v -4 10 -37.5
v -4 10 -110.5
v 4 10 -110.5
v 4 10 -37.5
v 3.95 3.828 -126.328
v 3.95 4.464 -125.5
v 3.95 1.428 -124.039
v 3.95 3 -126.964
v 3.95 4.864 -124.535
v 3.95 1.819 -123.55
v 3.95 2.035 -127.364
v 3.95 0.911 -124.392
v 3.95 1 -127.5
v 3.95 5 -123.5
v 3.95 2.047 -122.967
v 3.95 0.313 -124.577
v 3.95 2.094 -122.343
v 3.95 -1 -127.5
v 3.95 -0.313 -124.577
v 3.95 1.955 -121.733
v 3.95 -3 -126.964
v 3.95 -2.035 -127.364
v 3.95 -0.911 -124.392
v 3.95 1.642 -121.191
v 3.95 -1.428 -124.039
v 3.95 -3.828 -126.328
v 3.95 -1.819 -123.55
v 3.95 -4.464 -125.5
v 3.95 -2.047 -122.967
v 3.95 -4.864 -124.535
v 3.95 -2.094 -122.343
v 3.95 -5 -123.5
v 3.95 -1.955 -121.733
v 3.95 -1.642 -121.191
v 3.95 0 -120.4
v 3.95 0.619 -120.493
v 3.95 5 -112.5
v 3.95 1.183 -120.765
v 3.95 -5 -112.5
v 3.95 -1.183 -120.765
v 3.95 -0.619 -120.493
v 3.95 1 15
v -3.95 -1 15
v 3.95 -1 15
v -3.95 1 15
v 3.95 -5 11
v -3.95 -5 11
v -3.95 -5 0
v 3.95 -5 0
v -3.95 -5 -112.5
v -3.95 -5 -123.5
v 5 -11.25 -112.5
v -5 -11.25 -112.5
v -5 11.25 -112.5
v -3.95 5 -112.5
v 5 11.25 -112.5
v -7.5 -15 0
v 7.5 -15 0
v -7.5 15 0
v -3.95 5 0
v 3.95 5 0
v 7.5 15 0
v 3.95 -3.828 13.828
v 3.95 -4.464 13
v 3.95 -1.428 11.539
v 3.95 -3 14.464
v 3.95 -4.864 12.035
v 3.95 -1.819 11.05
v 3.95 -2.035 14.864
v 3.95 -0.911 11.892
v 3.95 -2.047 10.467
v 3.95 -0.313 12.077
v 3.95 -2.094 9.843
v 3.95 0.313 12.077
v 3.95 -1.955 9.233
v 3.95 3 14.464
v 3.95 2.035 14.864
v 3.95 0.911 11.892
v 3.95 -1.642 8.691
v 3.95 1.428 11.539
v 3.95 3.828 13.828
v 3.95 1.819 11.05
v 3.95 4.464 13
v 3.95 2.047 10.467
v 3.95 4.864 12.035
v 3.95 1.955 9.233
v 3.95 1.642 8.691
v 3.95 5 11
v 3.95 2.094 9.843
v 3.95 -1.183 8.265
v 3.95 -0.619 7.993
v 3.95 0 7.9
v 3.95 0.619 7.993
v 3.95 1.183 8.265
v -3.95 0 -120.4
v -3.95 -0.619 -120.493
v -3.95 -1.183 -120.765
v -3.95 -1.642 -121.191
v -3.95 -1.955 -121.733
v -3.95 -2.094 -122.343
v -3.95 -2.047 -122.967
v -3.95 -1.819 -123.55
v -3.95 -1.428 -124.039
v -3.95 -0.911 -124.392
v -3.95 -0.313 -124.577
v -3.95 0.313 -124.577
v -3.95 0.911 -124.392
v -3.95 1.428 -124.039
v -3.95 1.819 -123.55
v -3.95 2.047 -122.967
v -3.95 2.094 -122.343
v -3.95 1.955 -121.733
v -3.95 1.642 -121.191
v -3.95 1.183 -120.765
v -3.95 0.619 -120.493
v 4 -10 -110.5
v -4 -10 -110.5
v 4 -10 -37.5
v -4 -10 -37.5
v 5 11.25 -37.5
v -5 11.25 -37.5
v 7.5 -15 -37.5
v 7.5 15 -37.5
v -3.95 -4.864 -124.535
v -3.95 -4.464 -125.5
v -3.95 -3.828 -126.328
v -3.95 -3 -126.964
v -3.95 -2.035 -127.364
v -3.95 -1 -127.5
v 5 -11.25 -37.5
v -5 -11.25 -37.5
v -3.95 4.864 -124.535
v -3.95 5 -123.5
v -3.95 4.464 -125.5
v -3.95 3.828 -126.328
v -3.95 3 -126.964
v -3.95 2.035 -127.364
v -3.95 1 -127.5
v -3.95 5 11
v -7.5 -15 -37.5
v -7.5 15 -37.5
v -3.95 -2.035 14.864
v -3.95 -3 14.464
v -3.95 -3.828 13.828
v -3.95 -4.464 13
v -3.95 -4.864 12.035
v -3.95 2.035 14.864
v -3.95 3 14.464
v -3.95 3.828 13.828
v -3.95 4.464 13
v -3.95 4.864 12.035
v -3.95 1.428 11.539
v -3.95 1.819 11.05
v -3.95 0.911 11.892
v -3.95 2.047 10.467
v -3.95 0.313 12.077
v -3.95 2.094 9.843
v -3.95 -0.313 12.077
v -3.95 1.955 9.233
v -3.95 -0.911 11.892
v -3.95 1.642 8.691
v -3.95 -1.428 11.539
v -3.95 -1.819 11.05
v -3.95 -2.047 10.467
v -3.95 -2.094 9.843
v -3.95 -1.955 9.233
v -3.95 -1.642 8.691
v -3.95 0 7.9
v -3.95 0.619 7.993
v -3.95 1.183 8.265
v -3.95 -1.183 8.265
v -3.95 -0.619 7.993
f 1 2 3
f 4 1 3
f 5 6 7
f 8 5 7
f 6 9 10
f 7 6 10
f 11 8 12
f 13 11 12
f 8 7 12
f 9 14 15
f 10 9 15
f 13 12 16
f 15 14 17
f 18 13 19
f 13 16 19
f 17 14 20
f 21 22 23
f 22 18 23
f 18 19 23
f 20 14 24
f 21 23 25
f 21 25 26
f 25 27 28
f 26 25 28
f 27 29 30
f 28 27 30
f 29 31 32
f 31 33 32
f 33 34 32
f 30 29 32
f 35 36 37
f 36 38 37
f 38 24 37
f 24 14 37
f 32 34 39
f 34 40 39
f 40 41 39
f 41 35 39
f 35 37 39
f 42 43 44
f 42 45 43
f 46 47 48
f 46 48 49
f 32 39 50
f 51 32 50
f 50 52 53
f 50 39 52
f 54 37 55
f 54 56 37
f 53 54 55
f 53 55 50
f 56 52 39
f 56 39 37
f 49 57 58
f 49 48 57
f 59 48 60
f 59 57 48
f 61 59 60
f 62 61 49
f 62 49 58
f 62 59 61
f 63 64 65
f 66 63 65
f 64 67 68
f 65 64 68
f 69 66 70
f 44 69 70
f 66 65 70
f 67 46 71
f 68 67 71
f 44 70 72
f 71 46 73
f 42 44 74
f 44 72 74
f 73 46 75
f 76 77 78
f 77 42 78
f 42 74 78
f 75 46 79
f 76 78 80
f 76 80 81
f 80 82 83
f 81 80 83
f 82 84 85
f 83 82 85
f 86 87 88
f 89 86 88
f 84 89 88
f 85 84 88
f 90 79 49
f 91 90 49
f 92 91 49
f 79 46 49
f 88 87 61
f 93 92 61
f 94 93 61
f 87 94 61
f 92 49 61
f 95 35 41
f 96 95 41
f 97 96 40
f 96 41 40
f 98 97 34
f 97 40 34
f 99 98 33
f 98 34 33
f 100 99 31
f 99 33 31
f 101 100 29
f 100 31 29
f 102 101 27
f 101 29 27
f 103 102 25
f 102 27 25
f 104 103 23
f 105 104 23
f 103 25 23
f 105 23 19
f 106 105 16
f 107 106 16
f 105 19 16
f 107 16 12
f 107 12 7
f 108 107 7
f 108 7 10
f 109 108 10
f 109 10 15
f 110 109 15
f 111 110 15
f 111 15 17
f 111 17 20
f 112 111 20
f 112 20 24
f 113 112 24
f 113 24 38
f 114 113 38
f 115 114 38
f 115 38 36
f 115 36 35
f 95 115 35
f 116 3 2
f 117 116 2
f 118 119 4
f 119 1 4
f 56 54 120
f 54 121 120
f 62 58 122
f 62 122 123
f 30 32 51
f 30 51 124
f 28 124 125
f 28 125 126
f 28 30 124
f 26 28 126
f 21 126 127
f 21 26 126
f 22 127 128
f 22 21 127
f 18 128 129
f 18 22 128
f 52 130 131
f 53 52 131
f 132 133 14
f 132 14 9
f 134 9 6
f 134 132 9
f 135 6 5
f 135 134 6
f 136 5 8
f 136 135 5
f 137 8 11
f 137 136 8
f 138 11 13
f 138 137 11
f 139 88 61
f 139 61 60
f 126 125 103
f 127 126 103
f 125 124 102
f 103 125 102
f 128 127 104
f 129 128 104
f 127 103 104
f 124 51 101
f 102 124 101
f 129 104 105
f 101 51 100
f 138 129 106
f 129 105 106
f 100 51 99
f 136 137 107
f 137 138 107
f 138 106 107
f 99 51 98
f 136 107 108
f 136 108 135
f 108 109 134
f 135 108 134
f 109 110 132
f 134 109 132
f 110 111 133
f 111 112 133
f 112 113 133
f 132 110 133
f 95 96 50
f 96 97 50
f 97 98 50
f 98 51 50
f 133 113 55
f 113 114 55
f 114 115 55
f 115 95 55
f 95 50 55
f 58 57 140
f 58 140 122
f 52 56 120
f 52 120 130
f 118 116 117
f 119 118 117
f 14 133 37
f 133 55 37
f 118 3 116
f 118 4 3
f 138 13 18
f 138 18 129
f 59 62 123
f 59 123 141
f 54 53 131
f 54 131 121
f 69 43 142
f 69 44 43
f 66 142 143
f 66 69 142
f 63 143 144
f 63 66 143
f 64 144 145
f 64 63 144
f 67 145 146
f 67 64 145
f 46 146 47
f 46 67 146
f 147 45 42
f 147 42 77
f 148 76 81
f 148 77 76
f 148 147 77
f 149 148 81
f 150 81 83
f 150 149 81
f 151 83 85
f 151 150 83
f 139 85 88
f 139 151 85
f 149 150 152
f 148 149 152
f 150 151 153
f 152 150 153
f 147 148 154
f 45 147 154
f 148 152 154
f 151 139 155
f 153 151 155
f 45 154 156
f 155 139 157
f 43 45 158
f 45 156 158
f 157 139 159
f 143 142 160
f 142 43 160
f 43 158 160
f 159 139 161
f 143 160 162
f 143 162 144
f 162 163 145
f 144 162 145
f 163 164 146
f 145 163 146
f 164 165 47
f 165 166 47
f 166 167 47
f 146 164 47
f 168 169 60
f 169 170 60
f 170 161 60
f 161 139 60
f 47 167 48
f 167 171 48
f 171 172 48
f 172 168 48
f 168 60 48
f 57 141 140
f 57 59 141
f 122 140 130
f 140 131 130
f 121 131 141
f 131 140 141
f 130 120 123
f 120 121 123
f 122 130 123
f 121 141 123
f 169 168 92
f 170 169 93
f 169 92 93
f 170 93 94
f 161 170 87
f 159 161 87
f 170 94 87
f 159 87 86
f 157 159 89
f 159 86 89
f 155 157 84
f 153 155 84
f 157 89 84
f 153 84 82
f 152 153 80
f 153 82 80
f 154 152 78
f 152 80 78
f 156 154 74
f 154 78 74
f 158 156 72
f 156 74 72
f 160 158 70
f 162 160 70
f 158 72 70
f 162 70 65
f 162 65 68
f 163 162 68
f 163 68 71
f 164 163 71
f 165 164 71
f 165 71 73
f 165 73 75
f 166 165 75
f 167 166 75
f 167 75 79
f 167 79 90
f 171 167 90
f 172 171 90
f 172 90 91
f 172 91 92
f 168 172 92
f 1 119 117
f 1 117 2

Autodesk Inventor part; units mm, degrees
ref_plane "YZ Plane" through (0, 0, 0) normal (1, 0, 0) x (0, 1, 0)
ref_plane "XZ Plane" through (0, 0, 0) normal (0, 1, 0) x (-1, 0, 0)
sketch "스케치1" plane through (0, 0, 0) normal (0, 0, 1) x (1, 0, 0)
  line L0 (-7.5, -15) -> (7.5, -15)
  line L1 (7.5, -15) -> (7.5, 15)
  line L2 (7.5, 15) -> (-7.5, 15)
  line L3 (-7.5, 15) -> (-7.5, -15)
  point P0 (0, 0)
  dimension "d0" = 15
  dimension "d1" = 30
  dimension "d2" = 15
  dimension "d3" = 7.5
extrude "돌출1" add sketch "스케치1" against normal blind 37.5
sketch "스케치2" plane through (0, 0, -37.5) normal (0, 0, -1) x (-1, 0, 0)
  line L0 (5, 11.25) -> (-5, 11.25)
  line L1 (-5, 11.25) -> (-5, -11.25)
  line L2 (-5, -11.25) -> (5, -11.25)
  line L3 (5, -11.25) -> (5, 11.25)
  line L4 (5, 11.25) -> (-5, -11.25) construction
  line L5 (-5, 11.25) -> (5, -11.25) construction
  line L6 (-4, -10) -> (4, -10)
  line L7 (4, -10) -> (4, 10)
  line L8 (4, 10) -> (-4, 10)
  line L9 (-4, 10) -> (-4, -10)
  line L10 (-4, -10) -> (4, 10) construction
  line L11 (4, -10) -> (-4, 10) construction
  point P0 (0, 0)
  dimension "d6" = 10
  dimension "d7" = 22.5
  dimension "d10" = 8
  dimension "d11" = 20
extrude "돌출2" add sketch "스케치2" along normal blind 75
sketch "스케치3" plane through (0, 0, 0) normal (0, 0, 1) x (1, 0, 0)
  line L0 (-3.95, -5) -> (3.95, -5)
  line L1 (3.95, -5) -> (3.95, 5)
  line L2 (3.95, 5) -> (-3.95, 5)
  line L3 (-3.95, 5) -> (-3.95, -5)
  line L4 (-3.95, -5) -> (3.95, 5) construction
  line L5 (3.95, -5) -> (-3.95, 5) construction
  point P0 (0, 0)
  dimension "d12" = 7.9
  dimension "d13" = 10
extrude "돌출3" add sketch "스케치3" along normal blind 15
sketch "스케치4" plane through (3.95, -5, 0) normal (1, 0, 0) x (0, 0, -1)
  circle A0 centre (-10, 5) radius 2.1
  line L0 (0, 0) -> (-15, 0) projected
  line L1 (-15, 0) -> (-15, 10) projected
  point P0 (0, 5)
  dimension "d16" = 4.2
  dimension "d17" = 5
  dimension "d18" = 5
extrude "돌출4" cut sketch "스케치4" against normal blind 15
sketch "스케치5" plane through (0, 0, -112.5) normal (0, 0, -1) x (-1, 0, 0)
  line L0 (-5, 11.25) -> (5, 11.25) projected
  line L1 (5, -11.25) -> (-5, -11.25) projected
  line L2 (5, 11.25) -> (-5, 11.25)
  line L3 (-5, 11.25) -> (-5, -11.25)
  line L4 (-5, -11.25) -> (5, -11.25)
  line L5 (5, -11.25) -> (5, 11.25)
  point P0 (7.5, 15)
  point P1 (-7.5, -15)
extrude "돌출5" add sketch "스케치5" against normal blind 2
ref_plane "작업 평면1" through (0, 0, -56.25) normal (0, 0, 1) x (1, 0, 0)
mirror "미러1" about plane through (0, 0, -56.25) normal (0, 0, 1) of "돌출3"
mirror "미러2" about plane through (0, 0, -56.25) normal (0, 0, 1) of "돌출4"
fillet "모깎기1" radius 4 4 edges at (0, -5, 15) (0, 5, 15) (0, -5, -127.5) (0, 5, -127.5)
properties part number "각도조절 액추에이터_중간" material "스테인리스스틸"
